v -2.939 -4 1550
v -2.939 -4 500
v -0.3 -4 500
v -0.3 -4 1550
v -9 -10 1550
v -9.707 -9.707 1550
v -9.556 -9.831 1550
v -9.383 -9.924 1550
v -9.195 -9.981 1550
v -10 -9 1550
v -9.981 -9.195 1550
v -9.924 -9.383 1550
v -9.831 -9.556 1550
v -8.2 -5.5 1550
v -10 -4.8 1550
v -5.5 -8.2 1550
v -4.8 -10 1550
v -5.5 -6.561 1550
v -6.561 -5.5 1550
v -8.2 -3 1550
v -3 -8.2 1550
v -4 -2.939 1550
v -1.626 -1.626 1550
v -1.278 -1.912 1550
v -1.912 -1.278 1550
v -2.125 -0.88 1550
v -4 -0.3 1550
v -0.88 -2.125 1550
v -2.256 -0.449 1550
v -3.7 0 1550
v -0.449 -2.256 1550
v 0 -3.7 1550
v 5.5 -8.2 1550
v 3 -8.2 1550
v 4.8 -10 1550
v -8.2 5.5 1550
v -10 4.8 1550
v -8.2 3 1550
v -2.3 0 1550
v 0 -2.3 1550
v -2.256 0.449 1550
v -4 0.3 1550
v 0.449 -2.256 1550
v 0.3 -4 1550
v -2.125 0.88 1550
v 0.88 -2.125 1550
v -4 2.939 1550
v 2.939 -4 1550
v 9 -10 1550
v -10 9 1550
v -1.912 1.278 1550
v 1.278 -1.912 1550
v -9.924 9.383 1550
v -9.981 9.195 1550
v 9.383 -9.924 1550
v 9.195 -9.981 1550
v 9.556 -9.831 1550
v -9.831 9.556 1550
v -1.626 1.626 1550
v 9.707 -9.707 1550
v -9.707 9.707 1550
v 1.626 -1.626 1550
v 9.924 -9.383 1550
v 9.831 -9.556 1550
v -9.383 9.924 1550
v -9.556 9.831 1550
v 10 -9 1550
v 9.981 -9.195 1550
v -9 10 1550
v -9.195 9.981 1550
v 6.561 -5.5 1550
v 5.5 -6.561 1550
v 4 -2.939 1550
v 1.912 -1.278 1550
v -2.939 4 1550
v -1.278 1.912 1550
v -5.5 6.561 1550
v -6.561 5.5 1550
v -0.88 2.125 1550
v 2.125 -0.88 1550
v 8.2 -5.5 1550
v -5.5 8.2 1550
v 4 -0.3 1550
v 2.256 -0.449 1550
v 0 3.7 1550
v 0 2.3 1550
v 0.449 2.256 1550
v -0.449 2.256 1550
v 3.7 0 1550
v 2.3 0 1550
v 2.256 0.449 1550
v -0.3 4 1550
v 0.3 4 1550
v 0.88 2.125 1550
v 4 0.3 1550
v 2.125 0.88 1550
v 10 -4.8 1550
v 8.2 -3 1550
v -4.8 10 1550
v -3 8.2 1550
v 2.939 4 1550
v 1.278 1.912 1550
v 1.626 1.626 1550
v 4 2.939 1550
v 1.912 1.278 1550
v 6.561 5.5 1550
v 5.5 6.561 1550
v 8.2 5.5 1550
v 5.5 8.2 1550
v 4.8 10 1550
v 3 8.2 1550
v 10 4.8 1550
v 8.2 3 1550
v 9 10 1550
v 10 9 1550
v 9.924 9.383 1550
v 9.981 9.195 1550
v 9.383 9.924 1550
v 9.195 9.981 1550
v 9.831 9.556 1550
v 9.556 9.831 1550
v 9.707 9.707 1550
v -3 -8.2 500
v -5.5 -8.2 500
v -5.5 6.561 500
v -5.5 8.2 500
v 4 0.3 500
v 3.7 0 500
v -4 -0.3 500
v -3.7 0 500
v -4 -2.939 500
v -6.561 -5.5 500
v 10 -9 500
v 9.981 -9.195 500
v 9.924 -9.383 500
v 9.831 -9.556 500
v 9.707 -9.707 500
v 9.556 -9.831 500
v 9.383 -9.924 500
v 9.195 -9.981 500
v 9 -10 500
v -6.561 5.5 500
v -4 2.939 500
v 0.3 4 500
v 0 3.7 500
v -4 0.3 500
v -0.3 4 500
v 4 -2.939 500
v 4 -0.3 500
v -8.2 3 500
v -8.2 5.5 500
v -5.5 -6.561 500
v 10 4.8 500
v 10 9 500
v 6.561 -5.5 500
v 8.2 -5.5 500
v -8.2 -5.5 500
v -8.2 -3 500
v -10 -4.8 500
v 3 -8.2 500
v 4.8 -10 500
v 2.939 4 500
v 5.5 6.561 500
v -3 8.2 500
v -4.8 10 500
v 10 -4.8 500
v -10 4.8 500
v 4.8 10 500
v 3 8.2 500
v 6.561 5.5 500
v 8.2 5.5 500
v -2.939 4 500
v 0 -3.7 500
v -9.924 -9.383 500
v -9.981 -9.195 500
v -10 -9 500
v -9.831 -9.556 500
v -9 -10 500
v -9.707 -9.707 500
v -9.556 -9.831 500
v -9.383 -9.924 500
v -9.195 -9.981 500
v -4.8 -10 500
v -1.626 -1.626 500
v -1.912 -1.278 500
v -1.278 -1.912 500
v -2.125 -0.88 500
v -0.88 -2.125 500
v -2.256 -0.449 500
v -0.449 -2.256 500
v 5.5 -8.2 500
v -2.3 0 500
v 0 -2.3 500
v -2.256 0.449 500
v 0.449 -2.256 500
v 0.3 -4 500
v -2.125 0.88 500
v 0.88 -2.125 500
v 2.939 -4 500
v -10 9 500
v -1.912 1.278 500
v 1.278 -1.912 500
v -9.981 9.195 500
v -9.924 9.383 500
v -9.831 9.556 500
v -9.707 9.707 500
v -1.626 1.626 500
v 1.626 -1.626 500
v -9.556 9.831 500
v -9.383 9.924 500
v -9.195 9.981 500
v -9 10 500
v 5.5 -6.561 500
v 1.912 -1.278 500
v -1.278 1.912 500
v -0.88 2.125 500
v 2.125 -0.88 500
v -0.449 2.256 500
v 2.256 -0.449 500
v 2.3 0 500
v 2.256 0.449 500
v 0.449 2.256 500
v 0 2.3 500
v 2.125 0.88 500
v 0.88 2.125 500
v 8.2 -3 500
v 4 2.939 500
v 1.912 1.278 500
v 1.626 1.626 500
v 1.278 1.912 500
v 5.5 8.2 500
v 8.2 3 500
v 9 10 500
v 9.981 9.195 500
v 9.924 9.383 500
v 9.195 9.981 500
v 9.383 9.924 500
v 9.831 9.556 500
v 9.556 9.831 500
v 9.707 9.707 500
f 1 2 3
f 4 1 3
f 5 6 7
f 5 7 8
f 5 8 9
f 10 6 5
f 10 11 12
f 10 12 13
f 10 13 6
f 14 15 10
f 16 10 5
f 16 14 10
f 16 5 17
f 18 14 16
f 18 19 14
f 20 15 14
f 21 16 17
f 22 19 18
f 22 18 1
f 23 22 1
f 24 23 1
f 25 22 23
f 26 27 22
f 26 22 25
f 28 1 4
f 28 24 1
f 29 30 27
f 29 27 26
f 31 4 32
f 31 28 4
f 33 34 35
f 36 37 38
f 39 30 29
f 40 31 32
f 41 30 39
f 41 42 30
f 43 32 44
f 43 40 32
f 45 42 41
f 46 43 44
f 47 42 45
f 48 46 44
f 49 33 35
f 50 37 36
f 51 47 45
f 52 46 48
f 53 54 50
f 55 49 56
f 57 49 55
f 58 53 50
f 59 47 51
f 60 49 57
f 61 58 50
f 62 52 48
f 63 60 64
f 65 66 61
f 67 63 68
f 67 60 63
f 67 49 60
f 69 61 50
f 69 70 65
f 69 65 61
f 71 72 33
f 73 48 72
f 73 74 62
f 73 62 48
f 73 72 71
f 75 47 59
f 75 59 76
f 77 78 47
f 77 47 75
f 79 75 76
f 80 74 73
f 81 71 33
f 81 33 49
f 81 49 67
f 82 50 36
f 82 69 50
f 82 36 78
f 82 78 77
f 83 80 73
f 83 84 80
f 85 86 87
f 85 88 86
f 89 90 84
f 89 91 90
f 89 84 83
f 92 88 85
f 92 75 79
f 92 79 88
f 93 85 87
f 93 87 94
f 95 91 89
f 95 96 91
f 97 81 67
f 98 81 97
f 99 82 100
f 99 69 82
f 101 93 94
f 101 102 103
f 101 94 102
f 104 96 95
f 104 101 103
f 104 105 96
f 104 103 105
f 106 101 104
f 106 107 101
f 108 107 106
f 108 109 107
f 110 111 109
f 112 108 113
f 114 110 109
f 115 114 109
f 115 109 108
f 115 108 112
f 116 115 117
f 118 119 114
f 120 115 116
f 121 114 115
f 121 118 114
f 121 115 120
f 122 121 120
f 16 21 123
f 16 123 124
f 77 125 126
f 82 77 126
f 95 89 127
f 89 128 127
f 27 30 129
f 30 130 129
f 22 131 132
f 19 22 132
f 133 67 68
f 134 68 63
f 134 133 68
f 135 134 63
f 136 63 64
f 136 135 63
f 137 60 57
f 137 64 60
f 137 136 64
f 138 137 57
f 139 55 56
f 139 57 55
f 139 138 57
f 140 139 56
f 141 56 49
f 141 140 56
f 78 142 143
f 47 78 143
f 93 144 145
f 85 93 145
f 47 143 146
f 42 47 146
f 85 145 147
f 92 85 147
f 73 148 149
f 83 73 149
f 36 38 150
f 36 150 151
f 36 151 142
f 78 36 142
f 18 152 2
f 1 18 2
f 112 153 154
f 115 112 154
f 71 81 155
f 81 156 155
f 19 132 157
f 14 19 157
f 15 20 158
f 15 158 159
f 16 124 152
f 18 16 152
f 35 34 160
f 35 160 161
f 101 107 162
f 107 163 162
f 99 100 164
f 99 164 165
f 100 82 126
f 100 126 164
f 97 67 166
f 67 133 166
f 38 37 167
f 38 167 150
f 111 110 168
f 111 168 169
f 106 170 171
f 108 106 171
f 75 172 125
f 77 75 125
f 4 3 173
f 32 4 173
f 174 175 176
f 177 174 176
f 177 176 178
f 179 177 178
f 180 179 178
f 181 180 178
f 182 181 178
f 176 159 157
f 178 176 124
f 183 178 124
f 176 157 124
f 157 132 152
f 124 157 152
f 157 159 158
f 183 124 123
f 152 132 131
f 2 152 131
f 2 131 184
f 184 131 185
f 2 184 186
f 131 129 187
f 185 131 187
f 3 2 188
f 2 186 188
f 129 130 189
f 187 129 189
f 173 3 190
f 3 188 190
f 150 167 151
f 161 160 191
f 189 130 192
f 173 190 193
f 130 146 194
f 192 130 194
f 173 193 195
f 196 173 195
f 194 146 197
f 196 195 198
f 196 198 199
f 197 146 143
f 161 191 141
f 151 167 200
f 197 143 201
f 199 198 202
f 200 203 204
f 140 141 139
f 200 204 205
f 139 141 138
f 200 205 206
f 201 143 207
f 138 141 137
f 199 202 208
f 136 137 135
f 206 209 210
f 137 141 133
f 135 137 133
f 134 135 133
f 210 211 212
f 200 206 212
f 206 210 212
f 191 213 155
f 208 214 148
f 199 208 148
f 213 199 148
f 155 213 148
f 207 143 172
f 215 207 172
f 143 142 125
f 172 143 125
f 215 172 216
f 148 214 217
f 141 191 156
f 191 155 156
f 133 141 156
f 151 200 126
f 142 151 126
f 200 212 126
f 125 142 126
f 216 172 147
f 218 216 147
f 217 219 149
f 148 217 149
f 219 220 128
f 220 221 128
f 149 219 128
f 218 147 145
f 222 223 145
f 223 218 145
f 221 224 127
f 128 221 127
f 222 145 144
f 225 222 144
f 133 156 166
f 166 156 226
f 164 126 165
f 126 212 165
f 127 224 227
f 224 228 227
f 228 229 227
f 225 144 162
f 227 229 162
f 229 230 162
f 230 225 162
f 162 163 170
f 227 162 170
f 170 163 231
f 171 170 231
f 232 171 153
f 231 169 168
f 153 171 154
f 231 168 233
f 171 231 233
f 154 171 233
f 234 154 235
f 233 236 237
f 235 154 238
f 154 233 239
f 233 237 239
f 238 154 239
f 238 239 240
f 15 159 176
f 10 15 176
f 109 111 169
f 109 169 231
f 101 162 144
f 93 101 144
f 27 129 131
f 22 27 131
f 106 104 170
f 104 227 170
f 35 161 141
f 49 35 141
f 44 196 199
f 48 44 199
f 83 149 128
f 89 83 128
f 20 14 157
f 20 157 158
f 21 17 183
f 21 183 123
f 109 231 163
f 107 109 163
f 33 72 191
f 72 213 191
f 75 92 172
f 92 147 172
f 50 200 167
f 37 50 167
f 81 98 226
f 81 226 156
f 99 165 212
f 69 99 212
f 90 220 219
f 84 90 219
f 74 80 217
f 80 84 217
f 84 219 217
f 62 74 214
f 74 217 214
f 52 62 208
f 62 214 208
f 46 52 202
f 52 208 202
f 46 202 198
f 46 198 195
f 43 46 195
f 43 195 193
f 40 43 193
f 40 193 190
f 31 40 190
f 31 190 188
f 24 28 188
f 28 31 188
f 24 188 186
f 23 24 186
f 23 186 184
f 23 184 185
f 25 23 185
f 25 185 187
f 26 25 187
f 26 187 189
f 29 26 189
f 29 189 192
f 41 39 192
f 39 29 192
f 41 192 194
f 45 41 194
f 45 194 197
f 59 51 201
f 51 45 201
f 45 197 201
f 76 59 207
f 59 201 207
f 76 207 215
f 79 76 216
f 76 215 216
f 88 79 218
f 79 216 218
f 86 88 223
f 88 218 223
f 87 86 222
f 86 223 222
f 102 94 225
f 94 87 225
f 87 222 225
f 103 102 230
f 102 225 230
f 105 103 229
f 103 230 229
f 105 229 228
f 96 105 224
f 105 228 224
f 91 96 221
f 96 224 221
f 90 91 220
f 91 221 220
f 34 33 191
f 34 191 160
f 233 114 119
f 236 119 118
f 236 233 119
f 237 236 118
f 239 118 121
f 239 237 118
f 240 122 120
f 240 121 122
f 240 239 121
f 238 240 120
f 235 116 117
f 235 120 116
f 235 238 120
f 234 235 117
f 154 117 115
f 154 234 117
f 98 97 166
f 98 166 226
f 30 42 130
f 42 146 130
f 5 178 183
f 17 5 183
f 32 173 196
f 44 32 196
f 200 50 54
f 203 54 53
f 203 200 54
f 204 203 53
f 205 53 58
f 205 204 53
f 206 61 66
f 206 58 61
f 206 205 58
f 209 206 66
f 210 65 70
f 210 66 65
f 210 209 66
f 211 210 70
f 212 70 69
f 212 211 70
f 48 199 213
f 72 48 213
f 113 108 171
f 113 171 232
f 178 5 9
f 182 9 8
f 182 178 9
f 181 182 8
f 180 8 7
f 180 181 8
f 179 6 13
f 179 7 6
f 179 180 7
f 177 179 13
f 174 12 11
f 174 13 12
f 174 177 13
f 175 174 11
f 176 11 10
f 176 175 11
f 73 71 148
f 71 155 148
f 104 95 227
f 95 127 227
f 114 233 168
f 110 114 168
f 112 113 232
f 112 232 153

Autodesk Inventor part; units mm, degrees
ref_plane "YZ Plane" through (0, 0, 0) normal (1, 0, 0) x (0, 1, 0)
ref_plane "Plano1" through (0, 0, -500) normal (0, 0, 1) x (1, 0, 0)
ref_plane "Plano de trabalho2" through (-9, -10, 500) normal (0, 0, 1) x (1, 0, 0)
sketch "Esboço1" plane through (-9, -10, 500) normal (0, 0, 1) x (1, 0, 0)
  arc A0 (-1, 1) -> (0, 0) centre (0, 1) ccw projected
  line L0 (0, 0) -> (4.2, 0) projected
  line L1 (4.2, 0) -> (6, 1.8) projected
  line L2 (6, 1.8) -> (3.5, 1.8) projected
  line L3 (3.5, 1.8) -> (3.5, 3.4393) projected
  line L4 (3.5, 3.4393) -> (6.0607, 6) projected
  line L5 (6.0607, 6) -> (8.7, 6) projected
  line L6 (8.7, 6) -> (9, 6.3) projected
  line L7 (9, 6.3) -> (9.3, 6) projected
  line L8 (9.3, 6) -> (11.9393, 6) projected
  line L9 (11.9393, 6) -> (14.5, 3.4393) projected
  line L10 (14.5, 3.4393) -> (14.5, 1.8) projected
  line L11 (14.5, 1.8) -> (12, 1.8) projected
  line L12 (12, 1.8) -> (13.8, 0) projected
  line L13 (13.8, 0) -> (18, 0) projected
  arc A1 (18, 0) -> (19, 1) centre (18, 1) ccw projected
  line L14 (19, 1) -> (19, 5.2) projected
  line L15 (19, 5.2) -> (17.2, 7) projected
  line L16 (17.2, 7) -> (17.2, 4.5) projected
  line L17 (17.2, 4.5) -> (15.5607, 4.5) projected
  line L18 (15.5607, 4.5) -> (13, 7.0607) projected
  line L19 (13, 7.0607) -> (13, 9.7) projected
  line L20 (13, 9.7) -> (12.7, 10) projected
  line L21 (12.7, 10) -> (13, 10.3) projected
  line L22 (13, 10.3) -> (13, 12.9393) projected
  line L23 (13, 12.9393) -> (15.5607, 15.5) projected
  line L24 (15.5607, 15.5) -> (17.2, 15.5) projected
  line L25 (17.2, 15.5) -> (17.2, 13) projected
  line L26 (17.2, 13) -> (19, 14.8) projected
  line L27 (19, 14.8) -> (19, 19) projected
  arc A2 (19, 19) -> (18, 20) centre (18, 19) ccw projected
  line L28 (18, 20) -> (13.8, 20) projected
  line L29 (13.8, 20) -> (12, 18.2) projected
  line L30 (12, 18.2) -> (14.5, 18.2) projected
  line L31 (14.5, 18.2) -> (14.5, 16.5607) projected
  line L32 (14.5, 16.5607) -> (11.9393, 14) projected
  line L33 (11.9393, 14) -> (9.3, 14) projected
  line L34 (9.3, 14) -> (9, 13.7) projected
  line L35 (9, 13.7) -> (8.7, 14) projected
  line L36 (8.7, 14) -> (6.0607, 14) projected
  line L37 (6.0607, 14) -> (3.5, 16.5607) projected
  line L38 (3.5, 16.5607) -> (3.5, 18.2) projected
  line L39 (3.5, 18.2) -> (6, 18.2) projected
  line L40 (6, 18.2) -> (4.2, 20) projected
  line L41 (4.2, 20) -> (0, 20) projected
  arc A3 (0, 20) -> (-1, 19) centre (0, 19) ccw projected
  line L42 (-1, 19) -> (-1, 14.8) projected
  line L43 (-1, 14.8) -> (0.8, 13) projected
  line L44 (0.8, 13) -> (0.8, 15.5) projected
  line L45 (0.8, 15.5) -> (2.4393, 15.5) projected
  line L46 (2.4393, 15.5) -> (5, 12.9393) projected
  line L47 (5, 12.9393) -> (5, 10.3) projected
  line L48 (5, 10.3) -> (5.3, 10) projected
  line L49 (5.3, 10) -> (5, 9.7) projected
  line L50 (5, 9.7) -> (5, 7.0607) projected
  line L51 (5, 7.0607) -> (2.4393, 4.5) projected
  line L52 (2.4393, 4.5) -> (0.8, 4.5) projected
  line L53 (0.8, 4.5) -> (0.8, 7) projected
  line L54 (0.8, 7) -> (-1, 5.2) projected
  line L55 (-1, 5.2) -> (-1, 1) projected
  circle A4 centre (9, 10) radius 2.3 projected
extrude "Extrusão1" add sketch "Esboço1" along normal blind 1050
properties part number "PERFIL 2020 V-SLOT" material "6063-T5"
